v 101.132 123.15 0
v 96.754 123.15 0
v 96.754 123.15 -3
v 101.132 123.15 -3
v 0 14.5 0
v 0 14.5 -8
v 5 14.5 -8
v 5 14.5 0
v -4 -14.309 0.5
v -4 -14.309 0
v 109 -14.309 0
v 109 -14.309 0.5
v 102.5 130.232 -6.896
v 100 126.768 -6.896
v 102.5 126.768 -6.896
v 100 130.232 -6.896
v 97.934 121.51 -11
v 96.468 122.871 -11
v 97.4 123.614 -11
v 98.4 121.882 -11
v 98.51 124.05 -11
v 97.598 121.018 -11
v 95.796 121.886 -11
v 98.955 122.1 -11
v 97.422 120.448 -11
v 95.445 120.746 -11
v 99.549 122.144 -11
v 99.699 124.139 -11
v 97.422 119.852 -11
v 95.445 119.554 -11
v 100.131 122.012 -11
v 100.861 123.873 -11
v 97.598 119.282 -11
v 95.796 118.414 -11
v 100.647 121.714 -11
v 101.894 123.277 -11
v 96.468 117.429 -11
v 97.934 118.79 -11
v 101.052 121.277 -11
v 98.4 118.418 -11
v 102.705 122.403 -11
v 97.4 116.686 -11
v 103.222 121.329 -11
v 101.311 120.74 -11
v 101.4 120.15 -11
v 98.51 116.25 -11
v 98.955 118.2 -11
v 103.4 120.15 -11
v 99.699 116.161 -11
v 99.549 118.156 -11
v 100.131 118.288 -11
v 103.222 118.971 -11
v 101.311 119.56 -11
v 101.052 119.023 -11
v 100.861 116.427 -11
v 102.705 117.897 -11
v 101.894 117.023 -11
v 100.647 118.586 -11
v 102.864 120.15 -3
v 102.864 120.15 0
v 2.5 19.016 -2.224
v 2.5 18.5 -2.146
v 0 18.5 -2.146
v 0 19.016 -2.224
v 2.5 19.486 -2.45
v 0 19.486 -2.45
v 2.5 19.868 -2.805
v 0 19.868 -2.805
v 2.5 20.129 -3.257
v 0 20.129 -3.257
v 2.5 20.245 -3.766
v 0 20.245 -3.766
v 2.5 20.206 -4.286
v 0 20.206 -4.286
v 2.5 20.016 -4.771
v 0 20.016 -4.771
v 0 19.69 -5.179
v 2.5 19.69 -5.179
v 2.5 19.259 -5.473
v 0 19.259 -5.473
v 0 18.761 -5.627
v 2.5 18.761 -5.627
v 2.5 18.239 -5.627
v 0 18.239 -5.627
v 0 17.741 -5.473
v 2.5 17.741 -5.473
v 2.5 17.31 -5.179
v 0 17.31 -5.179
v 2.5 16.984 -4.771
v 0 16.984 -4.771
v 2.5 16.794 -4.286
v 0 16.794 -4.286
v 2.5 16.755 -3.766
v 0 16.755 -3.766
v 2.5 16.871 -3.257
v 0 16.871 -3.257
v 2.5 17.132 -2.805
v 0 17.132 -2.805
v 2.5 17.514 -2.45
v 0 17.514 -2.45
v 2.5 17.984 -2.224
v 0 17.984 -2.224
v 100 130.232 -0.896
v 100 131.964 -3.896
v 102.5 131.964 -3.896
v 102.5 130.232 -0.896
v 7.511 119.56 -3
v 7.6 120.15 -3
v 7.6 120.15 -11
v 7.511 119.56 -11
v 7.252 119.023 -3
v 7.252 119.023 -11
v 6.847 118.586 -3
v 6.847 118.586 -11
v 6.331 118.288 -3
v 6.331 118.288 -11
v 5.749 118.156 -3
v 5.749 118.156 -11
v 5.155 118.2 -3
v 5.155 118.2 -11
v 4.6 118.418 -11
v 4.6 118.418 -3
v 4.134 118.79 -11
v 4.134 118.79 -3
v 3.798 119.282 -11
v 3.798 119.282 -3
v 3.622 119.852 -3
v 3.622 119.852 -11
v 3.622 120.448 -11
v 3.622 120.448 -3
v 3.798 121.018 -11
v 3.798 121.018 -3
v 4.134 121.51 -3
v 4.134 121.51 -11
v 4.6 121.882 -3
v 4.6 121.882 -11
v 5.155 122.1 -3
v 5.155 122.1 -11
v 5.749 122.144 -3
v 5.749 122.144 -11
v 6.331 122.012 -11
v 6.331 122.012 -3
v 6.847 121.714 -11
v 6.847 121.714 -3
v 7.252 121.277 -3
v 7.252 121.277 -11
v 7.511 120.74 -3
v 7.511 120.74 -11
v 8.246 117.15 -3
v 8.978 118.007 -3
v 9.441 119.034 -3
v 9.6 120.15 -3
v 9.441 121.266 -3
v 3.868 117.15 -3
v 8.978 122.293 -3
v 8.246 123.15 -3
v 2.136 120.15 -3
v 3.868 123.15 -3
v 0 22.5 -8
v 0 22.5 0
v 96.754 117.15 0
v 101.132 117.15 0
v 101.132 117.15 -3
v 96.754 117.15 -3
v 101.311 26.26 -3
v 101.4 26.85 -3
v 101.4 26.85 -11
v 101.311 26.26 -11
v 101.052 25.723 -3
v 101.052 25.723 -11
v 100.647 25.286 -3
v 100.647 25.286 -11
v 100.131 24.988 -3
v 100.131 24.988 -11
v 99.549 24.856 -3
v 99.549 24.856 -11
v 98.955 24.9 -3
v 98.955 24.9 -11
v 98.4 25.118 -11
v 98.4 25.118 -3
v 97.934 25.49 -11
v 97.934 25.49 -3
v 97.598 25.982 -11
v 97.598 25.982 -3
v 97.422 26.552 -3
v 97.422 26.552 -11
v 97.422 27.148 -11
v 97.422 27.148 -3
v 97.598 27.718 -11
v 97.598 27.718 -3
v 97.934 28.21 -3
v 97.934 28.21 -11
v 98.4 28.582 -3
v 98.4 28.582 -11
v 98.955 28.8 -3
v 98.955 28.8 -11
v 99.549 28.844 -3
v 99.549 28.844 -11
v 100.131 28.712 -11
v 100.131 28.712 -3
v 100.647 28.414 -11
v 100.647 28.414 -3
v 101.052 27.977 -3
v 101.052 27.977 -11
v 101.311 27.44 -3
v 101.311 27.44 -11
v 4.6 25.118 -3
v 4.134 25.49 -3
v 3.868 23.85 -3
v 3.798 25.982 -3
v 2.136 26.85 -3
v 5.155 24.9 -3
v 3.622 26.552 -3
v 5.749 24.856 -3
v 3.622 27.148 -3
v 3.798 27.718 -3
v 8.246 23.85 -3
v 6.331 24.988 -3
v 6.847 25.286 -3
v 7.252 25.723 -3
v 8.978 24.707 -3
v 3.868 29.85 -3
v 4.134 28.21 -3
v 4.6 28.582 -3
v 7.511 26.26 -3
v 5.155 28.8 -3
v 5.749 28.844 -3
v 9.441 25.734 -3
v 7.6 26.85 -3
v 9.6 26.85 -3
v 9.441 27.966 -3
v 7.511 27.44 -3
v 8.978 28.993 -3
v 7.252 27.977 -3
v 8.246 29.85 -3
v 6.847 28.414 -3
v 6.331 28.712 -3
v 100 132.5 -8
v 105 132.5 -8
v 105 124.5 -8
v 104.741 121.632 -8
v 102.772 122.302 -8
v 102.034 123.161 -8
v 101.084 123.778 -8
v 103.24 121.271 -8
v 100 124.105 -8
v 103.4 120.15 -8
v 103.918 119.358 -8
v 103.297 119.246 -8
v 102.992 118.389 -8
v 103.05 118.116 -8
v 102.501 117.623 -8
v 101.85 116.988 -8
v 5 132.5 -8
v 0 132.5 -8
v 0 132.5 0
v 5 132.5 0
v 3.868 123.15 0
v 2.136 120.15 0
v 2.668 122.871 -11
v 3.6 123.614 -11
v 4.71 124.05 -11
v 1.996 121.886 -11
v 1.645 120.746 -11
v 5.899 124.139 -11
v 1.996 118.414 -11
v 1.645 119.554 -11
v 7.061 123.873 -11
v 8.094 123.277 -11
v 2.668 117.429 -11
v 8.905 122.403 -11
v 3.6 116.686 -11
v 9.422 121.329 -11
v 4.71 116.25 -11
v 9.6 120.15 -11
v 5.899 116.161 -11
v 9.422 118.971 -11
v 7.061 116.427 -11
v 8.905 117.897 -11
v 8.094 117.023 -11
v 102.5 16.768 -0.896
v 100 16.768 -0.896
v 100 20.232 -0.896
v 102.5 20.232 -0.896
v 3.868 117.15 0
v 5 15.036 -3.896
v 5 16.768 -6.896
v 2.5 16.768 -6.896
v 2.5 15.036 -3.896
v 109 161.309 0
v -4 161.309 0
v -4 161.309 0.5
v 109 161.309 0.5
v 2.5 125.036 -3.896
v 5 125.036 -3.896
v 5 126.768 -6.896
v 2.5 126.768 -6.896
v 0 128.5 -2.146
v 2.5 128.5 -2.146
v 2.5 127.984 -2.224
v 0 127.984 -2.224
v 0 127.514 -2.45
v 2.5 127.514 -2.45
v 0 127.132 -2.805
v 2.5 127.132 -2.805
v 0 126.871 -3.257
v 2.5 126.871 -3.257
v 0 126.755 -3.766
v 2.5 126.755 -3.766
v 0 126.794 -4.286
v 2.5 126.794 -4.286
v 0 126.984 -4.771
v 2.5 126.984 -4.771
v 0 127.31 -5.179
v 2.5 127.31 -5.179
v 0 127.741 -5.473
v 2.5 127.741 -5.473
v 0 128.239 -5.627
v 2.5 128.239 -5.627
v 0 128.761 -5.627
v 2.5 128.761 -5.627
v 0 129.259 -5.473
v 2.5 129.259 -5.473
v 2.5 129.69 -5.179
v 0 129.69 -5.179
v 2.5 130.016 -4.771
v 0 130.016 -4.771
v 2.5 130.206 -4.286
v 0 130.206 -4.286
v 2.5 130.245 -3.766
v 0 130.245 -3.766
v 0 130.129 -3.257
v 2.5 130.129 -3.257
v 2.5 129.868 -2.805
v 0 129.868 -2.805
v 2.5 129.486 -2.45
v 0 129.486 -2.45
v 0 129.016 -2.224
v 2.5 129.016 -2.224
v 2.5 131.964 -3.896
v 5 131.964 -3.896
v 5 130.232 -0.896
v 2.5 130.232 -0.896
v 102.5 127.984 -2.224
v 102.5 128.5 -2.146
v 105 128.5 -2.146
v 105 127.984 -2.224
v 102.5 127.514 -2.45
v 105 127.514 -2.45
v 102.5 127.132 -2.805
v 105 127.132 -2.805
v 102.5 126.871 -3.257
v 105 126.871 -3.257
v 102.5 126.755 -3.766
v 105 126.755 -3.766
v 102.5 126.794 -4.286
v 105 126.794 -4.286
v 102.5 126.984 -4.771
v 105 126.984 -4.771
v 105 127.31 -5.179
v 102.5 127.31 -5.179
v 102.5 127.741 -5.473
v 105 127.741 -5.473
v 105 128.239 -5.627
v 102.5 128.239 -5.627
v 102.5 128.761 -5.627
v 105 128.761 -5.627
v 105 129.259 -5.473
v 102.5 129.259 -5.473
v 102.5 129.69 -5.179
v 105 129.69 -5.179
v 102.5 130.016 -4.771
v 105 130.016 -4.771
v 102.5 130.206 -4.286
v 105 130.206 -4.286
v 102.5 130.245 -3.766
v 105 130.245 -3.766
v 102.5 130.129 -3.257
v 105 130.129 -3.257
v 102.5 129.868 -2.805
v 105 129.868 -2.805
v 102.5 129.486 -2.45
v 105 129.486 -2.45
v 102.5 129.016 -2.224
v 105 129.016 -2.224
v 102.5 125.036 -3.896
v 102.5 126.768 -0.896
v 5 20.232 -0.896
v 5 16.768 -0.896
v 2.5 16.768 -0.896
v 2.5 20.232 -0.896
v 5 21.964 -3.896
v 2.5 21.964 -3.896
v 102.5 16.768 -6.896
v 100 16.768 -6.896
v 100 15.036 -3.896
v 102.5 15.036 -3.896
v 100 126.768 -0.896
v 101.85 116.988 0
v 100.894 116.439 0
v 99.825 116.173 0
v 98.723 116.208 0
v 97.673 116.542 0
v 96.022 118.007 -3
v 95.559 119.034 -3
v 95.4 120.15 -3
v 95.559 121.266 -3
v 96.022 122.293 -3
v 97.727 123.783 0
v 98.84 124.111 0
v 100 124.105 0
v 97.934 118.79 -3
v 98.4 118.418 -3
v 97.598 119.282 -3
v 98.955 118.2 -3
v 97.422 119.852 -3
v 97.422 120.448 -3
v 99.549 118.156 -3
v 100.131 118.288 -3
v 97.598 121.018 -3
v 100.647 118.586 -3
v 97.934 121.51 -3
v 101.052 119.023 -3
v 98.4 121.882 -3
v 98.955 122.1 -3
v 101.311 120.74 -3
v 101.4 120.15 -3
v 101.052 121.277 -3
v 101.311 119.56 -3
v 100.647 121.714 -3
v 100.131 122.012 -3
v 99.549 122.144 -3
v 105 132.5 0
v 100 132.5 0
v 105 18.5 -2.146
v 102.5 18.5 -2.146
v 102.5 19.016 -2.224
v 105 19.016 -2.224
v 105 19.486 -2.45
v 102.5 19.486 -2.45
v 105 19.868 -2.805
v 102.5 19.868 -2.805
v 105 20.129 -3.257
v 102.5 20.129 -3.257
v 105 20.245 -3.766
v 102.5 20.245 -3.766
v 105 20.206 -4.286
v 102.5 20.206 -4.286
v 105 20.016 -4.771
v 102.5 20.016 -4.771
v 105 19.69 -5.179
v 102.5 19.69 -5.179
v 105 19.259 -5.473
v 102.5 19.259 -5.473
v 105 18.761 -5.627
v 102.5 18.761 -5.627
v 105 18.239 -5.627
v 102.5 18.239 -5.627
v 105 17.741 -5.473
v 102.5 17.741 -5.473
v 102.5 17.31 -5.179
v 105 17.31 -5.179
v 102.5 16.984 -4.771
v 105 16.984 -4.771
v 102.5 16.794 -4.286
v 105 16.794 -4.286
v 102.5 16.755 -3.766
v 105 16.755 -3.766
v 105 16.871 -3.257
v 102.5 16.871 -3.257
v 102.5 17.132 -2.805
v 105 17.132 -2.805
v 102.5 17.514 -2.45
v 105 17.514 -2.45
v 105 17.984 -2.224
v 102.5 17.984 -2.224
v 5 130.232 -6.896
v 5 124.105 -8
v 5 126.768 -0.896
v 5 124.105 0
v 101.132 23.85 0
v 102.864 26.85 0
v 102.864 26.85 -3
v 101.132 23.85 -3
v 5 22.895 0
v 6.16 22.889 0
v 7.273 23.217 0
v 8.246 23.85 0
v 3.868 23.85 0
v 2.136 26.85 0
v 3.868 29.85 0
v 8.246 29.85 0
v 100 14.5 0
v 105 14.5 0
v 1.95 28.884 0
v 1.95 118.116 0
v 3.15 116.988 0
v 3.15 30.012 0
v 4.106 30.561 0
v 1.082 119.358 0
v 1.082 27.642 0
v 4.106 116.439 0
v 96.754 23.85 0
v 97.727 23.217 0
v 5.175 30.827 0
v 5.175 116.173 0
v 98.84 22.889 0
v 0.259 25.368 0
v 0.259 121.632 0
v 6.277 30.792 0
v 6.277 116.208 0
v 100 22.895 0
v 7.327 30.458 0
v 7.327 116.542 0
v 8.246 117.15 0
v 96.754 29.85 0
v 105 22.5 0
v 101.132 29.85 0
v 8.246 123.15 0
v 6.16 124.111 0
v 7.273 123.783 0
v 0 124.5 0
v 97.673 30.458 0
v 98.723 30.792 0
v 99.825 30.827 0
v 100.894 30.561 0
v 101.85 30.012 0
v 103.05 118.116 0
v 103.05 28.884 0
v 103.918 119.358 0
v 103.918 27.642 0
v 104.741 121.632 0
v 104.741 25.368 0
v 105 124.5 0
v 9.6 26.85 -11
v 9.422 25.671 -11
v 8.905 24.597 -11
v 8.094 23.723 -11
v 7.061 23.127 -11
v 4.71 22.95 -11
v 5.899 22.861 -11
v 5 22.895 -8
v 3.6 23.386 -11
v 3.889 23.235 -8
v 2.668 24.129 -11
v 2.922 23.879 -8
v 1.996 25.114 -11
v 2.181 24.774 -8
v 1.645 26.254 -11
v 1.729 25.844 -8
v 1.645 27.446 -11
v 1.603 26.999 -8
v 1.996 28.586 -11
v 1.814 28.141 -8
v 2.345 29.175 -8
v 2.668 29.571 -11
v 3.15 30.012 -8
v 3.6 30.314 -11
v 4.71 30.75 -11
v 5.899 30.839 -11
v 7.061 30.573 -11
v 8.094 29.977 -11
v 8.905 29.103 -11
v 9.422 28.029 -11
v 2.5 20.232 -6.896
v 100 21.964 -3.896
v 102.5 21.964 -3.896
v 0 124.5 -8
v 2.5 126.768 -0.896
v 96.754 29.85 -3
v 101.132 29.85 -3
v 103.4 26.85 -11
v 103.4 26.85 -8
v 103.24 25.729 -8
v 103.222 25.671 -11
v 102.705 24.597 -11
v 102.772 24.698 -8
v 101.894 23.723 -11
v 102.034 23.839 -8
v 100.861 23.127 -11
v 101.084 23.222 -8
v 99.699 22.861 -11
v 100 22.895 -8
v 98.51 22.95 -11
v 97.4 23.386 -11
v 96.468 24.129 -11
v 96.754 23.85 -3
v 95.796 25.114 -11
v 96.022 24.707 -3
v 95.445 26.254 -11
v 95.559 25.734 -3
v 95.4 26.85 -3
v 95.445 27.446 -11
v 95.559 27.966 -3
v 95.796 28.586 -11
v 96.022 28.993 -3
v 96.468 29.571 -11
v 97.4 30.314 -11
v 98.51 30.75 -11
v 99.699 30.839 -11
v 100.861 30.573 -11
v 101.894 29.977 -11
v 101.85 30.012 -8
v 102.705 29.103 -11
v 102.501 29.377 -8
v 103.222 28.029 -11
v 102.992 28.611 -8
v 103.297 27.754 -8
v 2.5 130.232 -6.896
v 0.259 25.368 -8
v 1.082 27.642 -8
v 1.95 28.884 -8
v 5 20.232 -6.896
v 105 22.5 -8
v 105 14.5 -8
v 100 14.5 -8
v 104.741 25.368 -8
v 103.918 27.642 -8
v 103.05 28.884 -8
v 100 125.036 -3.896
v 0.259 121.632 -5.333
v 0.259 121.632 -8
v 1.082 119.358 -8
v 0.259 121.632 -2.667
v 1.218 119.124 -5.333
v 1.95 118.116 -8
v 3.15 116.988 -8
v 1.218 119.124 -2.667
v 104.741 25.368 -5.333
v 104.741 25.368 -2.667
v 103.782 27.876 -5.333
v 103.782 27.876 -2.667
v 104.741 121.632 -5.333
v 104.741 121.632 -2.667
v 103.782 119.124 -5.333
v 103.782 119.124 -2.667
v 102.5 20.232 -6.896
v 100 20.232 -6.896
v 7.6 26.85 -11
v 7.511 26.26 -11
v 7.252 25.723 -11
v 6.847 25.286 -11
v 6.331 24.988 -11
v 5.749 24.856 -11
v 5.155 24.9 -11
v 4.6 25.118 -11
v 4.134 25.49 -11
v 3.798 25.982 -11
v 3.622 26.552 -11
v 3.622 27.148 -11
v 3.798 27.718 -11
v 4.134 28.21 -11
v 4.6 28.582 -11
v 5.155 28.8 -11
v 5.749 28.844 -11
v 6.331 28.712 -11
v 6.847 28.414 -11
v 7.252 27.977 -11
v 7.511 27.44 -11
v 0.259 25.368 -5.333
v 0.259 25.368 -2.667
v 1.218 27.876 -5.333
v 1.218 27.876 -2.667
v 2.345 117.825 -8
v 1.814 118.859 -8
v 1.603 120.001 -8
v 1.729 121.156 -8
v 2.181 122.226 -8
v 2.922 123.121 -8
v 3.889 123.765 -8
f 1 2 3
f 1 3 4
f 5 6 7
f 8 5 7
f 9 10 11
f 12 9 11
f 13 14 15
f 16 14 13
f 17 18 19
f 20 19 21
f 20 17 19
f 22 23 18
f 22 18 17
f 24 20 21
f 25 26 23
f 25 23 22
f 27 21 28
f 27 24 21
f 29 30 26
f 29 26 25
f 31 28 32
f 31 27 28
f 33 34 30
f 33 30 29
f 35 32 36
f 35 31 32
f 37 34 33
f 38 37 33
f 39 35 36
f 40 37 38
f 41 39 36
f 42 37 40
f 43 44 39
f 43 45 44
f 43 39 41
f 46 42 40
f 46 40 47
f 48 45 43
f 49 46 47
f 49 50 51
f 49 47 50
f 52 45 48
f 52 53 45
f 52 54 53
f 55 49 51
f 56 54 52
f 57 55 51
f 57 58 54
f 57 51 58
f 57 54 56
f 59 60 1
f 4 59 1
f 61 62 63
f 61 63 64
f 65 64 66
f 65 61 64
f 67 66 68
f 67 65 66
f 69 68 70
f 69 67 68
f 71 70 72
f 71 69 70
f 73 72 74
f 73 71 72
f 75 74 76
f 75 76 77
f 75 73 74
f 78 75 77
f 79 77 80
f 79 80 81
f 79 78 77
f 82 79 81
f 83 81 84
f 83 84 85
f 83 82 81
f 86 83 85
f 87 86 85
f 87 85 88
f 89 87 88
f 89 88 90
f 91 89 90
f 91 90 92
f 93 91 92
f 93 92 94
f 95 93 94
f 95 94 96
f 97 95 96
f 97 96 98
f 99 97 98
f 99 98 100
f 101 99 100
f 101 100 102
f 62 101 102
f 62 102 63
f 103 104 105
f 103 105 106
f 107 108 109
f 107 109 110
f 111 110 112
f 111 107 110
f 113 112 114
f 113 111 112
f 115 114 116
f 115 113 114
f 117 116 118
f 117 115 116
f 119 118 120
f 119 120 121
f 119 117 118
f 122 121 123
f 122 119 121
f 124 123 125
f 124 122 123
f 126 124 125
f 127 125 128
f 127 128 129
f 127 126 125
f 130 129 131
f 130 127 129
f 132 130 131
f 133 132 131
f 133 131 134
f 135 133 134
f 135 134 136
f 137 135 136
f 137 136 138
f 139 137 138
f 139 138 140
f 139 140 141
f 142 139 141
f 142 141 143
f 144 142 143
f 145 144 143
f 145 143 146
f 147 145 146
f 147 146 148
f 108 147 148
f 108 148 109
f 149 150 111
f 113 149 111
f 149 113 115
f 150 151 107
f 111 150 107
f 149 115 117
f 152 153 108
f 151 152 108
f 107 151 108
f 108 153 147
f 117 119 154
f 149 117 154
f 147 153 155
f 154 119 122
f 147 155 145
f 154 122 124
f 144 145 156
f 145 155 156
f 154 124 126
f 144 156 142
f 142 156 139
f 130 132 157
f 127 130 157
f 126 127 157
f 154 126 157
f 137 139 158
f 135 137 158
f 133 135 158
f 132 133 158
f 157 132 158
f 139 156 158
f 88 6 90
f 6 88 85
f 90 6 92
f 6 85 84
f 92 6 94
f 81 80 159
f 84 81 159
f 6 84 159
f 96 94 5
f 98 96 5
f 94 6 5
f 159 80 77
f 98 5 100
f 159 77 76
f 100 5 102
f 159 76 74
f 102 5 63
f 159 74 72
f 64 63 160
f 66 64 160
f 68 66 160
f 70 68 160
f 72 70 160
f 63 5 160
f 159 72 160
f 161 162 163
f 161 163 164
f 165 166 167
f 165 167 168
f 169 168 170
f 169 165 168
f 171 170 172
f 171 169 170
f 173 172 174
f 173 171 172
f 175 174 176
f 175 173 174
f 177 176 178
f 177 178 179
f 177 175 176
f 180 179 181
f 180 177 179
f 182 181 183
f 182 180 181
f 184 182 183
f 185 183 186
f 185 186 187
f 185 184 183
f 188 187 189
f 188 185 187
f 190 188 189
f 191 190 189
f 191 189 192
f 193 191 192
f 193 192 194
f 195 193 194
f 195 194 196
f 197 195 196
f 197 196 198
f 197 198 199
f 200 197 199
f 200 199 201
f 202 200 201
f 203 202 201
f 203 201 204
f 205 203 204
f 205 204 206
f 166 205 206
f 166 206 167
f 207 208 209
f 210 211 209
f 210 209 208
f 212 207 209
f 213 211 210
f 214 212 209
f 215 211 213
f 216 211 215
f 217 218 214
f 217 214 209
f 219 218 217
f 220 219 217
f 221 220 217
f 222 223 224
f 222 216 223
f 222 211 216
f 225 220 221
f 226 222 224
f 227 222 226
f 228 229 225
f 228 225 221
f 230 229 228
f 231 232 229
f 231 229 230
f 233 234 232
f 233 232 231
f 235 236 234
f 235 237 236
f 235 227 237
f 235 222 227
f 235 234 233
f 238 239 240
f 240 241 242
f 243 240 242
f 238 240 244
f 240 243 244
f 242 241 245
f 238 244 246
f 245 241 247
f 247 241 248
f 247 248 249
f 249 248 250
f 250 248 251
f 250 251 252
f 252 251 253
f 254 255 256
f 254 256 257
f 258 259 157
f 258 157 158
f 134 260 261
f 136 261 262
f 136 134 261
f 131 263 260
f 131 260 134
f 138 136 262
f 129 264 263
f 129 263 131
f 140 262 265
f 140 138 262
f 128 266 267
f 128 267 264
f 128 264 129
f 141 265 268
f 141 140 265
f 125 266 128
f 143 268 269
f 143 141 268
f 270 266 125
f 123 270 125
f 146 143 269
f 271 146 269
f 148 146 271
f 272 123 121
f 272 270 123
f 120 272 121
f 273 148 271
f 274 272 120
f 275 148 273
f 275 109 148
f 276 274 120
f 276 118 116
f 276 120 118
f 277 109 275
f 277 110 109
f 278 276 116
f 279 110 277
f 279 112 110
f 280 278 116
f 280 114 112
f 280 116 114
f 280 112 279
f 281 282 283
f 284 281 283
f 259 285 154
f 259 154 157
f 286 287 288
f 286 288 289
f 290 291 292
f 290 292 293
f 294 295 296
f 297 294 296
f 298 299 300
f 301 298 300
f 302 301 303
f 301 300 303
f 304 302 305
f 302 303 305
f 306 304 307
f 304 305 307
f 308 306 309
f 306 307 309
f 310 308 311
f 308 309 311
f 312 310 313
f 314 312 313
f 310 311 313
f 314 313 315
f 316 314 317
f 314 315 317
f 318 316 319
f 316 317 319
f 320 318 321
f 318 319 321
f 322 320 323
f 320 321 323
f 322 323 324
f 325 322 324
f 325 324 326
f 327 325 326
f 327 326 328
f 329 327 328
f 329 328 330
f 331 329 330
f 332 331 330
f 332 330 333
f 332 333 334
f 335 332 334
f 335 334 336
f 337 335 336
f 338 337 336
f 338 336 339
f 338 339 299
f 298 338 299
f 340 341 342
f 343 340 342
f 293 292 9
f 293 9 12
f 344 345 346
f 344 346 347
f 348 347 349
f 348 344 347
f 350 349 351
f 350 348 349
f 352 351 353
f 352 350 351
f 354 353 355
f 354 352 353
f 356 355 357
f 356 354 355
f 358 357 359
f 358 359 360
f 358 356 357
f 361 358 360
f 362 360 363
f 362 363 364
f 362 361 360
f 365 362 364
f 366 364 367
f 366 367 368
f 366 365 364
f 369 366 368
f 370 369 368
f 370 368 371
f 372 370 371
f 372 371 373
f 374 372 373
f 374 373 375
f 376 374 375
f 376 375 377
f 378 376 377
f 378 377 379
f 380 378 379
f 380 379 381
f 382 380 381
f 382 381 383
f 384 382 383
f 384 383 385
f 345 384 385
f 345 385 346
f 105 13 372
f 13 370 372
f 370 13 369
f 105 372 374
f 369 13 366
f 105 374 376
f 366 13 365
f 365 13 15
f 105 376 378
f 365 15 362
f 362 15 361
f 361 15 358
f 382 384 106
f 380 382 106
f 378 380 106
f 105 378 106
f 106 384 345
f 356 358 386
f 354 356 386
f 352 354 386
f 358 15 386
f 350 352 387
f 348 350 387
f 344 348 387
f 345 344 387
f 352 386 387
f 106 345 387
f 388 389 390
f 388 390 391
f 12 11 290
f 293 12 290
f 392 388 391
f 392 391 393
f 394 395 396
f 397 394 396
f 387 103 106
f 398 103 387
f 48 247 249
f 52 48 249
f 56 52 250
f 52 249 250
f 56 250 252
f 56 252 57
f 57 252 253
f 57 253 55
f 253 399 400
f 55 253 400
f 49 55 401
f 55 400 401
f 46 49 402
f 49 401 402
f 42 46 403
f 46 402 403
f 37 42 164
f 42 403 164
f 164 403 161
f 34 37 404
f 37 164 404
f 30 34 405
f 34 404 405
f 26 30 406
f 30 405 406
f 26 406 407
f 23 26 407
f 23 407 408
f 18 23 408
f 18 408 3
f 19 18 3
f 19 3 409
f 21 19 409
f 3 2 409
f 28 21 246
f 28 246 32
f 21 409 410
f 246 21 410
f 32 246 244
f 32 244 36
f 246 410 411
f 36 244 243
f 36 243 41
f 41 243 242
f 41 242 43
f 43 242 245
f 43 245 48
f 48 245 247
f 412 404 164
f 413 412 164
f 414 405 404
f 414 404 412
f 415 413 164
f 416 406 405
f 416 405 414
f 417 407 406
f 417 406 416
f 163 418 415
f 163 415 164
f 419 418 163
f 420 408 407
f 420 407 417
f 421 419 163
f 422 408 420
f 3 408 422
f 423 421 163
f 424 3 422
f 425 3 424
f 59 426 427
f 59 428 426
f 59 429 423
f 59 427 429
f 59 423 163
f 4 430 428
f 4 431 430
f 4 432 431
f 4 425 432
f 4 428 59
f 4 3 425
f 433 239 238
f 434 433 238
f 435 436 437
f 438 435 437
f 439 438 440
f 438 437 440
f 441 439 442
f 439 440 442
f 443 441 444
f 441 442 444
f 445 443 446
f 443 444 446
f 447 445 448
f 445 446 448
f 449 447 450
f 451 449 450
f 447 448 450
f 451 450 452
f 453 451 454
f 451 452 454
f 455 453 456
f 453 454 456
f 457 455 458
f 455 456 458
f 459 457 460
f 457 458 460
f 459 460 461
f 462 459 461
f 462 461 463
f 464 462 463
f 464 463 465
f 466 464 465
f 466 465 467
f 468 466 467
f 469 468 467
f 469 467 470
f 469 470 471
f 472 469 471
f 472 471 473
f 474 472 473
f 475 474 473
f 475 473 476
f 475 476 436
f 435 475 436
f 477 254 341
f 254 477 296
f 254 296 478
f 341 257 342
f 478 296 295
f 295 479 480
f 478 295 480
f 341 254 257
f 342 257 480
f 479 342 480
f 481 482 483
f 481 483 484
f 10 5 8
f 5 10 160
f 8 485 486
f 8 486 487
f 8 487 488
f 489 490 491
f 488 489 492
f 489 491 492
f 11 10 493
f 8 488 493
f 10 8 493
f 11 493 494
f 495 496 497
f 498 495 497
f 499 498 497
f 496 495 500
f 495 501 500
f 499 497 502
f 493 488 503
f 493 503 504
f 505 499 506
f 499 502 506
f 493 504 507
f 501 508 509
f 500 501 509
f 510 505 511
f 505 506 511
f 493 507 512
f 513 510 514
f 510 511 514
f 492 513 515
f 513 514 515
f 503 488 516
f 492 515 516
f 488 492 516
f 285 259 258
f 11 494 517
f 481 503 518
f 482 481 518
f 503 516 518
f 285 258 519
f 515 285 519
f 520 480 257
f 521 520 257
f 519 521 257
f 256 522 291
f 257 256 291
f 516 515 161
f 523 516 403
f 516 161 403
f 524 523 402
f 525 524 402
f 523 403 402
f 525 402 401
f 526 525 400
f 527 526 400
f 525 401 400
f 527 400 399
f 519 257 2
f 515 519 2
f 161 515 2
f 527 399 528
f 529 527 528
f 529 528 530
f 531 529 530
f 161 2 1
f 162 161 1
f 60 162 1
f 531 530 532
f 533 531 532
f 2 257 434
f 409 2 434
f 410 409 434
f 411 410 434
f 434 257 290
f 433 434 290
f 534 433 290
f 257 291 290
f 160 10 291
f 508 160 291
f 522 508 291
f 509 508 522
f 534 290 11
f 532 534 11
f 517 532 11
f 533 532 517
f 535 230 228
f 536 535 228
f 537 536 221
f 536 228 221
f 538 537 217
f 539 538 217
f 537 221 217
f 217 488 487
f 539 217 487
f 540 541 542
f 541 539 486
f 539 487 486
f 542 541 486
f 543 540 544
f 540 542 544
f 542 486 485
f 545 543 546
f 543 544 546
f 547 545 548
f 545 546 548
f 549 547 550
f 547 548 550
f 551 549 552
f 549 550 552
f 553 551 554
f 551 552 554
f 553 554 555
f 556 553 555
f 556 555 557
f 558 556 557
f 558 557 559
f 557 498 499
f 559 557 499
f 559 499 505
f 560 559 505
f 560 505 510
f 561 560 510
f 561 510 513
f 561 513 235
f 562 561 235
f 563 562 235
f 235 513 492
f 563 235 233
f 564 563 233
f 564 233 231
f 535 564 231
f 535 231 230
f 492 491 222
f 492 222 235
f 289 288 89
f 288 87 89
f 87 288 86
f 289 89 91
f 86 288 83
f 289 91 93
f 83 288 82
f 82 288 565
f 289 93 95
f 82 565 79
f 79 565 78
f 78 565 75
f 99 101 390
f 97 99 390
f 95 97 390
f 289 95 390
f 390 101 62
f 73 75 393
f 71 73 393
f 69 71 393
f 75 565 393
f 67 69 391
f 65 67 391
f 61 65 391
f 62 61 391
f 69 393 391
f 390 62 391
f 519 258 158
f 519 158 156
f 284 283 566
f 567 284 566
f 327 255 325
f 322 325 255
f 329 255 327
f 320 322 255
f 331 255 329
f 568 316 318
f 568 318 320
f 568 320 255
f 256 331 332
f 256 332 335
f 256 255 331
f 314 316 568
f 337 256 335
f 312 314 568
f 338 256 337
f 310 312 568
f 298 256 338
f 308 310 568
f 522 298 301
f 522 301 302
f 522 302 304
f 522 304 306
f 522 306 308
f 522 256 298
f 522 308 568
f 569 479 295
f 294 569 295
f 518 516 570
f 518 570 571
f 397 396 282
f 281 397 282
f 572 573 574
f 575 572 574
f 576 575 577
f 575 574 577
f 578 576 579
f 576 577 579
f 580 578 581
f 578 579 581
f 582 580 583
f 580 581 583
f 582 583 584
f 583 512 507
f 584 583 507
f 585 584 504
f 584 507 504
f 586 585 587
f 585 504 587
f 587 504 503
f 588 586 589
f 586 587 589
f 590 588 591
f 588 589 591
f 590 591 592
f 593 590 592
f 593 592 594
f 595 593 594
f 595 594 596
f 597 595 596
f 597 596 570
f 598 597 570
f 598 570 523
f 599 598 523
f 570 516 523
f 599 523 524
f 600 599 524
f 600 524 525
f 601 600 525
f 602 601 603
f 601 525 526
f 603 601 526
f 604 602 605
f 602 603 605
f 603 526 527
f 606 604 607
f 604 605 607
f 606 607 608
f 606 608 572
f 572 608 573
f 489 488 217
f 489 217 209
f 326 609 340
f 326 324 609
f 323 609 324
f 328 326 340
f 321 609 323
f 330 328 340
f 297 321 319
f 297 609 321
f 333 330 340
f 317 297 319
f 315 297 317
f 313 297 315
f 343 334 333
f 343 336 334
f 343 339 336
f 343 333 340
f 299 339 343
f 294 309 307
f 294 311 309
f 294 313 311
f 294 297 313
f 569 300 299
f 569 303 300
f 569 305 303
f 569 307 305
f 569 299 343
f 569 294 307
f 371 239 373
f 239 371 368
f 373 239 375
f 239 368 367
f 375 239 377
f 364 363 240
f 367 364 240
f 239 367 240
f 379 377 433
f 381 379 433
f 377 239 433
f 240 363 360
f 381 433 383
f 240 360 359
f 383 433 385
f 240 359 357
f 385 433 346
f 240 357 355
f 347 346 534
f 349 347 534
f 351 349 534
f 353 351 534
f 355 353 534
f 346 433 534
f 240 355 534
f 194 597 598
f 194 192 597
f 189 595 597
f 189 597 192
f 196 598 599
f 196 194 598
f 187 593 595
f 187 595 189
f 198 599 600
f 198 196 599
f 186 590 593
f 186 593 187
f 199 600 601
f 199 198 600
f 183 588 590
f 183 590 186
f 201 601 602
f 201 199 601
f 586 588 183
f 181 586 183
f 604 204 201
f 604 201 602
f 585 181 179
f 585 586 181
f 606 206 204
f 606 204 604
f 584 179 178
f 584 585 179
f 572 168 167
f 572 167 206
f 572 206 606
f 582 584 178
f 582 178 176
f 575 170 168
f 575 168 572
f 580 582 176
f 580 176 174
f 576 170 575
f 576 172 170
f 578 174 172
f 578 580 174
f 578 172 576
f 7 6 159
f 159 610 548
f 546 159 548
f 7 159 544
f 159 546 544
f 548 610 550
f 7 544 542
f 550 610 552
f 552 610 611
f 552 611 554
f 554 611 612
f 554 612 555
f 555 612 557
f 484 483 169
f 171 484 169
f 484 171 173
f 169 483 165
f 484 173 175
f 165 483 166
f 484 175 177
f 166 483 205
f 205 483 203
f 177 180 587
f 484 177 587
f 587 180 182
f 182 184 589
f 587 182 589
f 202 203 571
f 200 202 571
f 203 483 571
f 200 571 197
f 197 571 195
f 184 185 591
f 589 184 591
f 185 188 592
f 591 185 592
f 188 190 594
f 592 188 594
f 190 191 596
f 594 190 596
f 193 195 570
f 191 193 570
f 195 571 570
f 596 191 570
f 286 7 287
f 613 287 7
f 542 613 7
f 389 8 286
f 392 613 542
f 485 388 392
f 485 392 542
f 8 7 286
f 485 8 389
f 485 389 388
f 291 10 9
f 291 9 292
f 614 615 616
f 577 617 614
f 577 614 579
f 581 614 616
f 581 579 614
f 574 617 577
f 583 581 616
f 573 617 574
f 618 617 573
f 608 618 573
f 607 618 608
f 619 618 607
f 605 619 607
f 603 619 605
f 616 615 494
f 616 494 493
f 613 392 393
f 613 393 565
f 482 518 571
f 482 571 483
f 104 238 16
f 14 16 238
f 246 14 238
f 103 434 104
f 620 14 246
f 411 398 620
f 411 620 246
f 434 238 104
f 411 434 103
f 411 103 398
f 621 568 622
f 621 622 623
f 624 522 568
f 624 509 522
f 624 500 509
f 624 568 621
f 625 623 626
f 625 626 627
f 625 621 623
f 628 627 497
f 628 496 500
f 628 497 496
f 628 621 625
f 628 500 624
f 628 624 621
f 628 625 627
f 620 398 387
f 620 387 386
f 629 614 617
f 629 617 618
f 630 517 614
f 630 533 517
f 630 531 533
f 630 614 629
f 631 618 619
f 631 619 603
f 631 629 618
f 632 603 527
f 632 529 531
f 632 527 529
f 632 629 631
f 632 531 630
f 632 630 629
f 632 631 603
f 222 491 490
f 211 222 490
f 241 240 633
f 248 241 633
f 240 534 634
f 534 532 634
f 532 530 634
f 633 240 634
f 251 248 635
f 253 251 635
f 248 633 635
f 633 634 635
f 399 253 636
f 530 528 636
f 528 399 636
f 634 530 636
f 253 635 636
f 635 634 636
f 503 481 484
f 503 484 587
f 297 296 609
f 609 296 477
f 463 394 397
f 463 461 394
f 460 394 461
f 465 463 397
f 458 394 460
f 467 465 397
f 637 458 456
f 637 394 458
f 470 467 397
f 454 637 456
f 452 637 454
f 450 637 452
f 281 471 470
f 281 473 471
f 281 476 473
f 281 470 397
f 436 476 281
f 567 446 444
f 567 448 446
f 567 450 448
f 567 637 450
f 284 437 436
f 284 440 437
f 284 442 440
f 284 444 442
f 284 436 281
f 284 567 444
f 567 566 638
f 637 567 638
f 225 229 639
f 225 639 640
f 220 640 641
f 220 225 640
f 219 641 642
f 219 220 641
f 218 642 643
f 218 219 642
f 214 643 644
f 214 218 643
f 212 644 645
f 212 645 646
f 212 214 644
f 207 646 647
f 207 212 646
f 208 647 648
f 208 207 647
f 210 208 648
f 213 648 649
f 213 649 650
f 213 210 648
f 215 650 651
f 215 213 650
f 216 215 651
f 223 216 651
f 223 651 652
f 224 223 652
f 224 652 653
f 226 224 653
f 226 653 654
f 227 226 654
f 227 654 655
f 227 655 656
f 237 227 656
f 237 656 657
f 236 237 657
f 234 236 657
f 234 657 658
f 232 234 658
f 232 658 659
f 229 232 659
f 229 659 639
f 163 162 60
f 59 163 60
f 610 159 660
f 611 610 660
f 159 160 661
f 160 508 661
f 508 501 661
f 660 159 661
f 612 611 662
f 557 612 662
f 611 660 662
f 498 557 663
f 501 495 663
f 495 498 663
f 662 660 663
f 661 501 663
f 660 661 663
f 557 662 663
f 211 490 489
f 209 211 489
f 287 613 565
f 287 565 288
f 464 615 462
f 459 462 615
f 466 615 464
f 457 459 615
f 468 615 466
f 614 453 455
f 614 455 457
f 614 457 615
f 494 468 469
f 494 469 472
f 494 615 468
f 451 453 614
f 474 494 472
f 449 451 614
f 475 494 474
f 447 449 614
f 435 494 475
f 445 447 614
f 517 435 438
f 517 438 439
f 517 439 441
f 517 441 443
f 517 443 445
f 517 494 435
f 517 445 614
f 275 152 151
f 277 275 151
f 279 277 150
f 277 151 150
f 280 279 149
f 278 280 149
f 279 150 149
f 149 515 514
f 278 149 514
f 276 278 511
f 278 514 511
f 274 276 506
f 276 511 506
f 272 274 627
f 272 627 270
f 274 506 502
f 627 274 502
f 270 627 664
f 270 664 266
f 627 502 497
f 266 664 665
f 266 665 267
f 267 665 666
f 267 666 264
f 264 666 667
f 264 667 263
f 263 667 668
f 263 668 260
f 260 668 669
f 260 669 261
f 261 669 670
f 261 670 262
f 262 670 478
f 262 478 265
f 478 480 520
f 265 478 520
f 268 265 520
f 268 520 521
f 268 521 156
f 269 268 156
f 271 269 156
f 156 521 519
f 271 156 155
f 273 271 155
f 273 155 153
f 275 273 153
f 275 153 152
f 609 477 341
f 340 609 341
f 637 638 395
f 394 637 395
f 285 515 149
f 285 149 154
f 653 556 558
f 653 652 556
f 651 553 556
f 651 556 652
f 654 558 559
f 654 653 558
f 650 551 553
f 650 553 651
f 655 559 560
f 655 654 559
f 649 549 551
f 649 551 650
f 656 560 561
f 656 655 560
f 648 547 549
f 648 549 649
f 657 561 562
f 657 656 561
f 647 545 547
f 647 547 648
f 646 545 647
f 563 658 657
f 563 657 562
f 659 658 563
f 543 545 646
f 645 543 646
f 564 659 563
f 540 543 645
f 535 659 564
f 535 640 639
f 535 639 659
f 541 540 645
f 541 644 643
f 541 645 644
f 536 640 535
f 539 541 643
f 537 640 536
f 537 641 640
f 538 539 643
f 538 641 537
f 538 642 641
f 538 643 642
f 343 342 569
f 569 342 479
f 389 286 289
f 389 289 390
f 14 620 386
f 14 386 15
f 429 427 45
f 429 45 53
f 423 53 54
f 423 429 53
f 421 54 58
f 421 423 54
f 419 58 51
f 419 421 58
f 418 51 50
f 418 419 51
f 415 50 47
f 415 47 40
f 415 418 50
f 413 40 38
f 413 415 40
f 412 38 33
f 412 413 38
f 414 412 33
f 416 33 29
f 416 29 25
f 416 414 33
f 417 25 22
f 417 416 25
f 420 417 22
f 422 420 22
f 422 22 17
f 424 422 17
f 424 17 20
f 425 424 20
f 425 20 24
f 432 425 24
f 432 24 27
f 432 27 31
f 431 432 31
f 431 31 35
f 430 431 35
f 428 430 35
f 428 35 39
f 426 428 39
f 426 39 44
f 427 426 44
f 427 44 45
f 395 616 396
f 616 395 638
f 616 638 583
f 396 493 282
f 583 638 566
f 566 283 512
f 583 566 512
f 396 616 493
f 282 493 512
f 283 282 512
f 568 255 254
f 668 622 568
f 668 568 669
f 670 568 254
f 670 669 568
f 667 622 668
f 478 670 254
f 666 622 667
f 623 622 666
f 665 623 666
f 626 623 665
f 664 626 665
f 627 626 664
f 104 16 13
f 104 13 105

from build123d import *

# Parameters (mm, degrees)
SKETCH1_W               = 113
SKETCH1_H               = 175.618176042
BOSS_EXTRUDE1_DEPTH     = 0.5
SKETCH2_R               = 4
SKETCH2_R_2             = 2
BOSS_EXTRUDE2_DEPTH     = 11
CUT_EXTRUDE1_DEPTH      = 3
SKETCH4_W               = 5
SKETCH4_H               = 8
BOSS_EXTRUDE3_DEPTH     = 8
CUT_EXTRUDE2_REACH      = 194.244
SKETCH5_R               = 1.75
CUT_EXTRUDE3_DEPTH      = 2.5
MIRROR2_COPY_1_SKETCH_W = 5
MIRROR2_COPY_1_SKETCH_H = 8
MIRROR2_COPY_1_DEPTH    = 8
MIRROR2_COPY_2_REACH    = 194.244
MIRROR2_COPY_2_SKETCH_R = 1.75
MIRROR2_COPY_3_DEPTH    = 2.5


with BuildPart() as part:
    # Sketch1 → Boss-Extrude1 (new body)
    with BuildSketch(Plane.XY):
        with Locations((52.5, 73.5)):
            Rectangle(SKETCH1_W, SKETCH1_H)
    extrude(amount=BOSS_EXTRUDE1_DEPTH)

    # Sketch2 → Boss-Extrude2 (add)
    with BuildSketch(Plane(origin=(0, 0, 0), x_dir=(-1, 0, 0), z_dir=(0, 0, -1))):
        with Locations(Location((-5.6, 120.15, 0), (0, 0, 180))):
            Circle(SKETCH2_R)
        with Locations(Location((-5.6, 120.15, 0), (0, 0, 180))):
            Circle(SKETCH2_R_2, mode=Mode.SUBTRACT)
        with Locations(Location((-5.6, 26.85, 0), (0, 0, 180))):
            Circle(SKETCH2_R)
        with Locations(Location((-5.6, 26.85, 0), (0, 0, 180))):
            Circle(SKETCH2_R_2, mode=Mode.SUBTRACT)
        with Locations(Location((-99.4, 26.85, 0), (0, 0, 180))):
            Circle(SKETCH2_R)
        with Locations(Location((-99.4, 26.85, 0), (0, 0, 180))):
            Circle(SKETCH2_R_2, mode=Mode.SUBTRACT)
        with Locations(Location((-99.4, 120.15, 0), (0, 0, 180))):
            Circle(SKETCH2_R)
        with Locations(Location((-99.4, 120.15, 0), (0, 0, 180))):
            Circle(SKETCH2_R_2, mode=Mode.SUBTRACT)
    extrude(amount=BOSS_EXTRUDE2_DEPTH)

    # Sketch3 → Cut-Extrude1 (cut)
    with BuildSketch(Plane(origin=(0, 0, 0), x_dir=(-1, 0, 0), z_dir=(0, 0, -1))):
        Polygon((-101.132050808, 123.15), (-97.667949192, 123.15), (-95.935898385, 120.15), (-97.667949192, 117.15), (-101.132050808, 117.15), (-102.864101615, 120.15), align=None)
        with BuildLine():
            Line((-95.935898385, 120.15), (-97.667949192, 117.15))
            Line((-97.667949192, 117.15), (-96.754248689, 117.15))
            ThreePointArc((-96.754248689, 117.15), (-95.754248689, 118.504248689), (-95.4, 120.15))
            ThreePointArc((-95.4, 120.15), (-95.754248689, 121.795751311), (-96.754248689, 123.15))
            Line((-96.754248689, 123.15), (-97.667949192, 123.15))
            Line((-97.667949192, 123.15), (-95.935898385, 120.15))
        make_face()
        Polygon((-3.867949192, 123.15), (-7.332050808, 123.15), (-9.064101615, 120.15), (-7.332050808, 117.15), (-3.867949192, 117.15), (-2.135898385, 120.15), align=None)
        with BuildLine():
            Line((-9.064101615, 120.15), (-7.332050808, 123.15))
            Line((-7.332050808, 123.15), (-8.245751311, 123.15))
            ThreePointArc((-8.245751311, 123.15), (-9.6, 120.15), (-8.245751311, 117.15))
            Line((-8.245751311, 117.15), (-7.332050808, 117.15))
            Line((-7.332050808, 117.15), (-9.064101615, 120.15))
        make_face()
        Polygon((-3.867949192, 23.85), (-7.332050808, 23.85), (-9.064101615, 26.85), (-7.332050808, 29.85), (-3.867949192, 29.85), (-2.135898385, 26.85), align=None)
        with BuildLine():
            Line((-9.064101615, 26.85), (-7.332050808, 29.85))
            Line((-7.332050808, 29.85), (-8.245751311, 29.85))
            ThreePointArc((-8.245751311, 29.85), (-9.6, 26.85), (-8.245751311, 23.85))
            Line((-8.245751311, 23.85), (-7.332050808, 23.85))
            Line((-7.332050808, 23.85), (-9.064101615, 26.85))
        make_face()
        Polygon((-101.132050808, 23.85), (-97.667949192, 23.85), (-95.935898385, 26.85), (-97.667949192, 29.85), (-101.132050808, 29.85), (-102.864101615, 26.85), align=None)
        with BuildLine():
            Line((-95.935898385, 26.85), (-97.667949192, 23.85))
            Line((-97.667949192, 23.85), (-96.754248689, 23.85))
            ThreePointArc((-96.754248689, 23.85), (-95.754248689, 25.204248689), (-95.4, 26.85))
            ThreePointArc((-95.4, 26.85), (-95.754248689, 28.495751311), (-96.754248689, 29.85))
            Line((-96.754248689, 29.85), (-97.667949192, 29.85))
            Line((-97.667949192, 29.85), (-95.935898385, 26.85))
        make_face()
    extrude(amount=CUT_EXTRUDE1_DEPTH, mode=Mode.SUBTRACT)

    # Sketch4 → Boss-Extrude3 (add)
    with BuildSketch(Plane(origin=(0, 0, 0), x_dir=(-1, 0, 0), z_dir=(0, 0, -1))):
        with Locations((-102.5, 18.5)):
            Rectangle(SKETCH4_W, SKETCH4_H)
        with BuildLine():
            add(Edge.make_bspline(
                [(-105, 22.5), (-105, 25.54291505), (-104.360830865, 28.066908547), (-101.849562653, 30.012221183)],
                knots=[0, 0, 0, 0, 1, 1, 1, 1], degree=3))
            Line((-105, 22.5), (-100, 22.5))
            Line((-100, 22.5), (-100, 22.895256013))
            ThreePointArc((-100, 22.895256013), (-103.271402382, 25.843896824), (-101.849562653, 30.012221183))
        make_face()
    boss_extrude3 = extrude(amount=BOSS_EXTRUDE3_DEPTH)

    # Sketch5 → Cut-Extrude2 (cut, up to next)
    with BuildSketch(Plane.ZY.offset(-100), mode=Mode.PRIVATE) as cut_extrude2_sk1:
        with Locations((-3.896353455, 18.5)):
            Circle(SKETCH5_R)
    cut_extrude2_tool1 = extrude(cut_extrude2_sk1.sketch, amount=-CUT_EXTRUDE2_REACH, mode=Mode.PRIVATE) & part.part
    cut_extrude2 = cut_extrude2_tool1.solids().sort_by_distance((100, 18.5, -3.896353))[0]
    add(cut_extrude2, mode=Mode.SUBTRACT)

    # Sketch6 → Cut-Extrude3 (cut)
    with BuildSketch(Plane.ZY.offset(-100)):
        Polygon((-3.896353455, 21.964101615), (-6.896353455, 20.232050808), (-6.896353455, 16.767949192), (-3.896353455, 15.035898385), (-0.896353455, 16.767949192), (-0.896353455, 20.232050808), align=None)
    cut_extrude3 = extrude(amount=-CUT_EXTRUDE3_DEPTH, mode=Mode.SUBTRACT)

    # Mirror1: Boss-Extrude3, Cut-Extrude2, Cut-Extrude3 across plane
    add(boss_extrude3.mirror(Plane.ZY.offset(-52.5)))
    add(cut_extrude2.mirror(Plane.ZY.offset(-52.5)), mode=Mode.SUBTRACT)
    add(cut_extrude3.mirror(Plane.ZY.offset(-52.5)), mode=Mode.SUBTRACT)

    # Mirror2: Boss-Extrude3, Cut-Extrude2, Cut-Extrude3 across plane
    add(boss_extrude3.mirror(Plane(origin=(0, 73.5, 0), x_dir=(0, 0, 1), z_dir=(0, -1, 0))))
    add(cut_extrude2.mirror(Plane(origin=(0, 73.5, 0), x_dir=(0, 0, 1), z_dir=(0, -1, 0))), mode=Mode.SUBTRACT)
    add(cut_extrude3.mirror(Plane(origin=(0, 73.5, 0), x_dir=(0, 0, 1), z_dir=(0, -1, 0))), mode=Mode.SUBTRACT)

    # Mirror2 copy 1 sketch → Mirror2 copy 1 (add)
    with BuildSketch(Plane(origin=(105, 147, 0), x_dir=(1, 0, 0), z_dir=(0, 0, -1))):
        with Locations((-102.5, 18.5)):
            Rectangle(MIRROR2_COPY_1_SKETCH_W, MIRROR2_COPY_1_SKETCH_H)
        with BuildLine():
            add(Edge.make_bspline(
                [(-105, 22.5), (-105, 25.54291505), (-104.360830865, 28.066908547), (-101.849562653, 30.012221183)],
                knots=[0, 0, 0, 0, 1, 1, 1, 1], degree=3))
            Line((-105, 22.5), (-100, 22.5))
            Line((-100, 22.5), (-100, 22.895256013))
            ThreePointArc((-100, 22.895256013), (-103.271402382, 25.843896824), (-101.849562653, 30.012221183))
        make_face()
    extrude(amount=MIRROR2_COPY_1_DEPTH)

    # Mirror2 copy 2 sketch → Mirror2 copy 2 (cut, up to next)
    with BuildSketch(Plane(origin=(5, 147, 0), x_dir=(0, 0, 1), z_dir=(1, 0, 0)), mode=Mode.PRIVATE) as mirror2_copy_2_sk1:
        with Locations((-3.896353455, 18.5)):
            Circle(MIRROR2_COPY_2_SKETCH_R)
    mirror2_copy_2_tool1 = extrude(mirror2_copy_2_sk1.sketch, amount=-MIRROR2_COPY_2_REACH, mode=Mode.PRIVATE) & part.part
    add(mirror2_copy_2_tool1.solids().sort_by_distance((5, 128.5, -3.896353))[0], mode=Mode.SUBTRACT)

    # Mirror2 copy 3 sketch → Mirror2 copy 3 (cut)
    with BuildSketch(Plane(origin=(5, 147, 0), x_dir=(0, 0, 1), z_dir=(1, 0, 0))):
        Polygon((-3.896353455, 21.964101615), (-6.896353455, 20.232050808), (-6.896353455, 16.767949192), (-3.896353455, 15.035898385), (-0.896353455, 16.767949192), (-0.896353455, 20.232050808), align=None)
    extrude(amount=-MIRROR2_COPY_3_DEPTH, mode=Mode.SUBTRACT)


solid = part.part
